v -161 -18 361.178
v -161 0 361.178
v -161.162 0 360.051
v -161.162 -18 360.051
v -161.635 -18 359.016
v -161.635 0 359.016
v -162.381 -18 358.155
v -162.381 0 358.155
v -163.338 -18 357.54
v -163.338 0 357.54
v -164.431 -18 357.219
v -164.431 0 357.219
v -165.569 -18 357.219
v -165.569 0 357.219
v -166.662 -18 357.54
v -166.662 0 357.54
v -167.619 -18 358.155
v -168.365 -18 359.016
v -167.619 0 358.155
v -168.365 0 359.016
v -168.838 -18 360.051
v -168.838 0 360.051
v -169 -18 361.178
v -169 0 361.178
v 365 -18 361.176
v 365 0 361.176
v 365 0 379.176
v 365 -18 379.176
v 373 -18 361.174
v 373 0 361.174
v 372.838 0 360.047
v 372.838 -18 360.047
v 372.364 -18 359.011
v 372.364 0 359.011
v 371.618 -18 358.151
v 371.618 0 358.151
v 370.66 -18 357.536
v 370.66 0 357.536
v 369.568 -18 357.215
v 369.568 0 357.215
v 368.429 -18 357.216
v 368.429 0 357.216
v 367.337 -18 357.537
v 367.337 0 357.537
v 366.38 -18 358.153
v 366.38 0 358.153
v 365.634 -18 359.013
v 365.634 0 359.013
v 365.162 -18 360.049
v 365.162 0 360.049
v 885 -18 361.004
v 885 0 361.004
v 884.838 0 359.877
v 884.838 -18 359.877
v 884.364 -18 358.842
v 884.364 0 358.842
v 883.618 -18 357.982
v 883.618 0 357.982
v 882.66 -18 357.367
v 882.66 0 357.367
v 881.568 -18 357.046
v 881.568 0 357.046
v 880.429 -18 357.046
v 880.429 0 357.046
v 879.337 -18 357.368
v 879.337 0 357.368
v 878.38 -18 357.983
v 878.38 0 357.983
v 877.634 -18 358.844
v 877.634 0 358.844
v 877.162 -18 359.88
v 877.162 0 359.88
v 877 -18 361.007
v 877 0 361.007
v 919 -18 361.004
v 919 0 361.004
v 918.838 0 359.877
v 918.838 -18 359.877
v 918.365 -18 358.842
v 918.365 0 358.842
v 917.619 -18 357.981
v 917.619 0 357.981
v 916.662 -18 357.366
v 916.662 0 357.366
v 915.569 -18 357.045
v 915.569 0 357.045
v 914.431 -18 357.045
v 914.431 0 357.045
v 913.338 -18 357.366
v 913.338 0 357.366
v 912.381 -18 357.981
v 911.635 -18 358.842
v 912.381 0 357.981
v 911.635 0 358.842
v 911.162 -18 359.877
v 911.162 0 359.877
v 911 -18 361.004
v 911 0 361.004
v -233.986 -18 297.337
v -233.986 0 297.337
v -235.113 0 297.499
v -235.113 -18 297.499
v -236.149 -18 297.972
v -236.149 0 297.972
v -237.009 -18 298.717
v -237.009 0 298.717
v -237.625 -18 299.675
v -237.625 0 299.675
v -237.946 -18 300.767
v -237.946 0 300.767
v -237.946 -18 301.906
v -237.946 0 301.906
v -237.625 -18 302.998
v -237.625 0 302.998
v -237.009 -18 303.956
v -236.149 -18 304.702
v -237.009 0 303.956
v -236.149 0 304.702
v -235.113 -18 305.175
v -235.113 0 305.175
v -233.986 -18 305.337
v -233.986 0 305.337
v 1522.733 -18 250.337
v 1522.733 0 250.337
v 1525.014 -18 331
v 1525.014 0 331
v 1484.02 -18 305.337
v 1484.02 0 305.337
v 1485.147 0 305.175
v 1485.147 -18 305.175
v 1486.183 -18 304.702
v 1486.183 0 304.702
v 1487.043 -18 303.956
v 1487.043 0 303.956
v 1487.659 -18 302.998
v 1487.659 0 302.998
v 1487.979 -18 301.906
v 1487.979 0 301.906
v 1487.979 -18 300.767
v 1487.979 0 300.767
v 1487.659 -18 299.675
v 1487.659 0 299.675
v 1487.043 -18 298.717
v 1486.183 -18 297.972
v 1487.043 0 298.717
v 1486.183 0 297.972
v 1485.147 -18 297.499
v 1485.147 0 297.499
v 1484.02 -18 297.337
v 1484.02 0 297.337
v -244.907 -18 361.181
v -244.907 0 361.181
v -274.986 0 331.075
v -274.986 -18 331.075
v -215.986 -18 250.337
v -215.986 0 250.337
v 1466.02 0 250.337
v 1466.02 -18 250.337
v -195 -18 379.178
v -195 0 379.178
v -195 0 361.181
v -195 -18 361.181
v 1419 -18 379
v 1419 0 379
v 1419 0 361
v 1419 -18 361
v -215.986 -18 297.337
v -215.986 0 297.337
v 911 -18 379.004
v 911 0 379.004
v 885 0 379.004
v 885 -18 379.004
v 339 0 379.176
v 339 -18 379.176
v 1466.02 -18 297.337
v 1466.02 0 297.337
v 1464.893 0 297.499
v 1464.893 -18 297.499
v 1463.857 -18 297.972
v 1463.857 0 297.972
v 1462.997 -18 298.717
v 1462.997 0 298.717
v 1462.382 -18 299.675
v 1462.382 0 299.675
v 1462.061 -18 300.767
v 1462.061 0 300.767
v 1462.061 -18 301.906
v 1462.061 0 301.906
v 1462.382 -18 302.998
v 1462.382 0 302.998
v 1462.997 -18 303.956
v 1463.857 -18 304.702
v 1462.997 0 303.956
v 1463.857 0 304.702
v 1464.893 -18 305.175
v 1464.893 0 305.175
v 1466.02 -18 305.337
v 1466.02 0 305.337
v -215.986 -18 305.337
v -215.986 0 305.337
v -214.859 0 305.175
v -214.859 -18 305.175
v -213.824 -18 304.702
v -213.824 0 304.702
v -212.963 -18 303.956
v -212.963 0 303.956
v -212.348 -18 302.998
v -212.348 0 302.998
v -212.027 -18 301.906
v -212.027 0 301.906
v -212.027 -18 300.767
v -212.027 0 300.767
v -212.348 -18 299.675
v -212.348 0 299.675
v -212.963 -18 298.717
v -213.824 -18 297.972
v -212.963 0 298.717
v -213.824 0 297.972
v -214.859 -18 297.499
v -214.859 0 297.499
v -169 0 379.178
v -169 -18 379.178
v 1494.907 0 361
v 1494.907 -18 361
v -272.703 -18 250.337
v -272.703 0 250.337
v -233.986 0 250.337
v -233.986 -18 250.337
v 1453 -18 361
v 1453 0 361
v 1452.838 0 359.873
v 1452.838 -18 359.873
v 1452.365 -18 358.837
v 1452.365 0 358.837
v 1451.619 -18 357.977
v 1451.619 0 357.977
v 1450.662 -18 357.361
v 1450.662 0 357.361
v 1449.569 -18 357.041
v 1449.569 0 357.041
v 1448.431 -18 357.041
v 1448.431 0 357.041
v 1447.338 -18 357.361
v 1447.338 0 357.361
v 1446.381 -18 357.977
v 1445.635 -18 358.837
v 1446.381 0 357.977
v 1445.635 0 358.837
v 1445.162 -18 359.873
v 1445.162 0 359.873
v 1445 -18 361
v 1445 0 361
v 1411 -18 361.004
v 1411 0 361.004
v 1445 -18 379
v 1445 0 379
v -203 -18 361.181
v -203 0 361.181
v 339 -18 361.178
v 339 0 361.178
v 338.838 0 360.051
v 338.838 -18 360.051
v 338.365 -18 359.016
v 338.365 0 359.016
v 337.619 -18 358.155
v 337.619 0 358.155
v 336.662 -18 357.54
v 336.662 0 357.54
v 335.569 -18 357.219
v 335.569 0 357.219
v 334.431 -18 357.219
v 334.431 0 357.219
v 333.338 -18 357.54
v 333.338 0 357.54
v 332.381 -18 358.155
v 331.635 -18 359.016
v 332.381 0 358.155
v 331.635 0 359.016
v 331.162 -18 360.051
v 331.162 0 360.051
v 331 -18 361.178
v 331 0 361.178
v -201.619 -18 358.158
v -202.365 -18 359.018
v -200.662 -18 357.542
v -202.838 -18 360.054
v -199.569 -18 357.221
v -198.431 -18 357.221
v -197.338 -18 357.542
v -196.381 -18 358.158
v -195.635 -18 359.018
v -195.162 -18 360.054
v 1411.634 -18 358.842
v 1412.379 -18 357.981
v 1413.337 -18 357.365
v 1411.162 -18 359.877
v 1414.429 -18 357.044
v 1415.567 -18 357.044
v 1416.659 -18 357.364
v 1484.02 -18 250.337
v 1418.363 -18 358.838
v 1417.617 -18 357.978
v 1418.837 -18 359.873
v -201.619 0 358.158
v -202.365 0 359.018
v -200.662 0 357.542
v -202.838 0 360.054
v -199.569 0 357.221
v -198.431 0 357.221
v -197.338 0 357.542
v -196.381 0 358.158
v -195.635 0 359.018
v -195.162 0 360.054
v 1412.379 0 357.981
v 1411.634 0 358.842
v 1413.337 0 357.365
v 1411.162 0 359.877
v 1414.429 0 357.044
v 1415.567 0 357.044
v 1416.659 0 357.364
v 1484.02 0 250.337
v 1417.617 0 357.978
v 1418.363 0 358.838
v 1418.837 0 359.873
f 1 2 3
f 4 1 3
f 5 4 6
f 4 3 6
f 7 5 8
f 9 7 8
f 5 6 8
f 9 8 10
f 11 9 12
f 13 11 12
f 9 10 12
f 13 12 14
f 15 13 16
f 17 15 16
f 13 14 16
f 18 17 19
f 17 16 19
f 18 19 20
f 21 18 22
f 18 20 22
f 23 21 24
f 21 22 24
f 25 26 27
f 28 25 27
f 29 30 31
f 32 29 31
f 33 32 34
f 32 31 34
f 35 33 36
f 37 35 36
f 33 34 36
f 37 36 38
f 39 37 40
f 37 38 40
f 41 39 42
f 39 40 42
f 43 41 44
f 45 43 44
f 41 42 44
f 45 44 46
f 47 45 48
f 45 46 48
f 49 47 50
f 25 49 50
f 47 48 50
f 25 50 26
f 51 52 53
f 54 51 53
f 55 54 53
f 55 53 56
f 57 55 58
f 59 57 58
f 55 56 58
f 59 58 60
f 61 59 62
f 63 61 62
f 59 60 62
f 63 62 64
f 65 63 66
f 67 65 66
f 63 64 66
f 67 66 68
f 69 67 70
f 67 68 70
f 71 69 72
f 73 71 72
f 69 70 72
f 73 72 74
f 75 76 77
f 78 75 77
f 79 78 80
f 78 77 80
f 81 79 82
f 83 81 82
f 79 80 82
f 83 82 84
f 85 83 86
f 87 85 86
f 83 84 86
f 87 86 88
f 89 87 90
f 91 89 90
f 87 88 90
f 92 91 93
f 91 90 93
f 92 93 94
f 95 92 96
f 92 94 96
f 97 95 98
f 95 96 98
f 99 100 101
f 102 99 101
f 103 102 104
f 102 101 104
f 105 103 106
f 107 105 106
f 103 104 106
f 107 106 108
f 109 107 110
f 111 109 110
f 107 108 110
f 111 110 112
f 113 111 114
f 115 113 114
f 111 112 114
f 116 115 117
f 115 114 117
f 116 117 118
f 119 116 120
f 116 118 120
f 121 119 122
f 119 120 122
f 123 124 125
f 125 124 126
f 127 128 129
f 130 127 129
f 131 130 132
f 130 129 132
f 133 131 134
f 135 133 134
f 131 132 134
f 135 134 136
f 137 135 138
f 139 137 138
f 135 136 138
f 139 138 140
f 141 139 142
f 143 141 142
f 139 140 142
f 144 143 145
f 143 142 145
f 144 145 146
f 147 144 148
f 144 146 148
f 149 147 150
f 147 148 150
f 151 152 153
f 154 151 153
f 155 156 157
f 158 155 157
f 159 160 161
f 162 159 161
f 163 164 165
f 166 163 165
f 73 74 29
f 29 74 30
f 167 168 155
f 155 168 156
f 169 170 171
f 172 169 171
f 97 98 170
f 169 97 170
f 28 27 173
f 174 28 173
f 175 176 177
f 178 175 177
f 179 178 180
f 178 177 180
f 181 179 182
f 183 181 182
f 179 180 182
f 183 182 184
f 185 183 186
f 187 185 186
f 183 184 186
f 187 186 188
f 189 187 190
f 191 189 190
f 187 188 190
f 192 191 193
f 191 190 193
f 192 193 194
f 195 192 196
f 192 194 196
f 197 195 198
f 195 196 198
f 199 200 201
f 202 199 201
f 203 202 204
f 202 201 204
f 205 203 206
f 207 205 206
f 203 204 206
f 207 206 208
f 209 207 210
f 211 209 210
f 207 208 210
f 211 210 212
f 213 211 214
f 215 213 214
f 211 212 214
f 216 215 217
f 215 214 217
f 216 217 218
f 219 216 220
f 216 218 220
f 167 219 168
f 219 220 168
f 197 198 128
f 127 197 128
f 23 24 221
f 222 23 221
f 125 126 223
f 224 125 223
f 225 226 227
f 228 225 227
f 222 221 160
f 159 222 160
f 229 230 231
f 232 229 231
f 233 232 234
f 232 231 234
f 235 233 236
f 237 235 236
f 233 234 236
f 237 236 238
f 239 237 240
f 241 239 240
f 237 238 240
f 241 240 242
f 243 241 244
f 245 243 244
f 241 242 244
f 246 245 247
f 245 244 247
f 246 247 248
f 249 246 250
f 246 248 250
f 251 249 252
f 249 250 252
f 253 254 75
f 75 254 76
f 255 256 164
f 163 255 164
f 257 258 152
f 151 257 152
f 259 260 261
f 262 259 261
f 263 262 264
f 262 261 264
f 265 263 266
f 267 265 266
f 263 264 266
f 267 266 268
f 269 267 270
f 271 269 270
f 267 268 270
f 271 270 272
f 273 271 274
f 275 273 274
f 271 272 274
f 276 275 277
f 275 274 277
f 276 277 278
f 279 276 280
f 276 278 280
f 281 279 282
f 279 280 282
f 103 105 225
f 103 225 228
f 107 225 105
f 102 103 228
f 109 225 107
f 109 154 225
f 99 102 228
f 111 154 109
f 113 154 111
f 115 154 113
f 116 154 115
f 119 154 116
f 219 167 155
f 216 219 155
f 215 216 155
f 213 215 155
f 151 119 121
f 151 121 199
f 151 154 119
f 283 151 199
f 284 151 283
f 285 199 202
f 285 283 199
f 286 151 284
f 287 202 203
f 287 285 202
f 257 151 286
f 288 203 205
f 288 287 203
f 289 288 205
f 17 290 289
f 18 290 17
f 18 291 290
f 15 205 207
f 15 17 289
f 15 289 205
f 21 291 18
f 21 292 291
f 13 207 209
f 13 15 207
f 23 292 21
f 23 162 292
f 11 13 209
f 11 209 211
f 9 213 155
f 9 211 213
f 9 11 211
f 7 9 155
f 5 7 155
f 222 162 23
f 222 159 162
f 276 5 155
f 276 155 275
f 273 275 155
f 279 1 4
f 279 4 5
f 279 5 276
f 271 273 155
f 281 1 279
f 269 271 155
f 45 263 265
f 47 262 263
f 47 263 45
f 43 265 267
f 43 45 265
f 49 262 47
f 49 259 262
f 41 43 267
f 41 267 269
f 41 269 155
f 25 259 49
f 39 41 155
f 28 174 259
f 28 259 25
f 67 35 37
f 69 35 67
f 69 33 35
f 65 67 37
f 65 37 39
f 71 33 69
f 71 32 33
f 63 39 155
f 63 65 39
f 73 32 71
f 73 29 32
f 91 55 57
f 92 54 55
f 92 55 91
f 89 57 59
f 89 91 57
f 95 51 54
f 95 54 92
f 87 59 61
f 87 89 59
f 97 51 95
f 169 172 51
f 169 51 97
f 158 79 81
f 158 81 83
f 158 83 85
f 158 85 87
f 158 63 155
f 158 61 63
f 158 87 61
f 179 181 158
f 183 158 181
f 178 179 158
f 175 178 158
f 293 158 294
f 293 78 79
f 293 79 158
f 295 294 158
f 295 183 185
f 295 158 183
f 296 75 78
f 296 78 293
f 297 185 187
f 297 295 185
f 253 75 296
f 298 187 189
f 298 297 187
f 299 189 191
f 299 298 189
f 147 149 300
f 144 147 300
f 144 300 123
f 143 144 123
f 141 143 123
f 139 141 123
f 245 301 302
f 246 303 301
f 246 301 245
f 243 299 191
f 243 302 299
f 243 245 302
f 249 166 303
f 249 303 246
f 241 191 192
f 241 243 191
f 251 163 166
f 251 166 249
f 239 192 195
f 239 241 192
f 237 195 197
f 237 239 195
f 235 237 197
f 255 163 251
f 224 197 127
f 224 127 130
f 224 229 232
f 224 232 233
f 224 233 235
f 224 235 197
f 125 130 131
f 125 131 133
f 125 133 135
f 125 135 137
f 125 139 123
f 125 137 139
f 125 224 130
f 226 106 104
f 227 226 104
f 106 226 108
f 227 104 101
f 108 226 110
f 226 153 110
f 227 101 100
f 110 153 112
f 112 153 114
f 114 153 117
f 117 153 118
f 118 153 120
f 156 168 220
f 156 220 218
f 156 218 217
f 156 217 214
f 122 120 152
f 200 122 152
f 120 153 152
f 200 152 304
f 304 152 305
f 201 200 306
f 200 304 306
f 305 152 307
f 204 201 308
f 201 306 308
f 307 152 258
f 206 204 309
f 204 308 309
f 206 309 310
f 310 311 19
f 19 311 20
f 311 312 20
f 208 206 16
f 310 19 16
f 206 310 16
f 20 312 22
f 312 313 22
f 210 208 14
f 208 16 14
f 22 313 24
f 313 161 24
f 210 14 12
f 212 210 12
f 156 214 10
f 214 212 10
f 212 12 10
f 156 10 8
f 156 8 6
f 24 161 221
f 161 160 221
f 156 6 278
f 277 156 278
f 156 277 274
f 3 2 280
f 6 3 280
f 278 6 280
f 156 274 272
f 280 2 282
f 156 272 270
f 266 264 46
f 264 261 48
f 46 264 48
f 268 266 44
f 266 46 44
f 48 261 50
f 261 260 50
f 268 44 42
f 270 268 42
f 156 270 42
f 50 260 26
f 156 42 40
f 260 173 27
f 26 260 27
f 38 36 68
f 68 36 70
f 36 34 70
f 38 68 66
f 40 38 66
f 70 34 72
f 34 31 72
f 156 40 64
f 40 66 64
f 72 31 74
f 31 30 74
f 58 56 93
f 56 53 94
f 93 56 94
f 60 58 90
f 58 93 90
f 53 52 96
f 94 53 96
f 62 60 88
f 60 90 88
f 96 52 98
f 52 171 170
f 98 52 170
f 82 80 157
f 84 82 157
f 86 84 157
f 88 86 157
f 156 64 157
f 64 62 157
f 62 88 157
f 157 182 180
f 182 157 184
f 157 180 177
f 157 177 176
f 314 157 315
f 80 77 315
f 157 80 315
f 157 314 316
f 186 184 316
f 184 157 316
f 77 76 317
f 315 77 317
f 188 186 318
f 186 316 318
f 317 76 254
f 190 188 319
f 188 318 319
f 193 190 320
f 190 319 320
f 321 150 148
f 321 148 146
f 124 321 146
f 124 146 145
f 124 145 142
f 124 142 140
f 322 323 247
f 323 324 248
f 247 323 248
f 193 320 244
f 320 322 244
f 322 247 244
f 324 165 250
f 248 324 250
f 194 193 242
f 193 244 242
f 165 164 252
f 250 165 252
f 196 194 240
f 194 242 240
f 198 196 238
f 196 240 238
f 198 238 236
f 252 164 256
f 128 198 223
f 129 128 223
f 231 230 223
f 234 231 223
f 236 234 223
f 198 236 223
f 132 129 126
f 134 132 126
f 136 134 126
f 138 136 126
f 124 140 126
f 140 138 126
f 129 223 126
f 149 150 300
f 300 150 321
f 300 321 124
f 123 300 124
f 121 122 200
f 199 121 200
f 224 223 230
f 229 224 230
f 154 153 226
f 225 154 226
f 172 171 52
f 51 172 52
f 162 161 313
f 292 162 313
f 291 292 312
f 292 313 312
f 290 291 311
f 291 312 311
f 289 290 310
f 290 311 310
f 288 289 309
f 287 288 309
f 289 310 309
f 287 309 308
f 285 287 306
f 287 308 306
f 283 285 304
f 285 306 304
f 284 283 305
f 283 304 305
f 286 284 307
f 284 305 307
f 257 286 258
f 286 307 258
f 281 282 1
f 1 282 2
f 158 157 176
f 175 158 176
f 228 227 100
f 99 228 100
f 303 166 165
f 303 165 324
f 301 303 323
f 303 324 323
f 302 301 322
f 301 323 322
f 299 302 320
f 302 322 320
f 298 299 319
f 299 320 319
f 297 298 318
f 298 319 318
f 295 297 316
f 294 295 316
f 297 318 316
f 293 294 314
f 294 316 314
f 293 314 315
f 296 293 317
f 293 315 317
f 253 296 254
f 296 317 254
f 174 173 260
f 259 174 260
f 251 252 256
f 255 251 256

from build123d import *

# Parameters (mm, degrees)
F1_DEPTH = 18


# Not quite as in the source:
# - ends of sketch curves that miss each other by under 0.0002 mm in the source are joined


with BuildPart() as f1:
    # F0 (on Front) → F1 (new body)
    with BuildSketch(Plane.XZ):
        with BuildLine():
            Line((1444.9999982887, 361), (1444.9999982887, 379))
            Line((1444.9999982887, 379), (1418.9999982887, 379))
            Line((1418.9999982887, 379), (1418.9999982887, 361.0032042947))
            Line((1418.9999982887, 361.0032042947), (1418.9999982887, 361))
            ThreePointArc((1418.9999982887, 361), (1414.9978620926, 357.0032048651), (1410.9999984313, 361.0042723931))
            Line((1410.9999984313, 361.0042723931), (918.9999984313, 361.0042723931))
            ThreePointArc((918.9999984313, 361.0042723931), (914.9999984313, 357.0042723931), (910.9999984313, 361.0042723931))
            Line((910.9999984313, 361.0042723931), (910.9999984313, 379.0042723931))
            Line((910.9999984313, 379.0042723931), (884.9999984313, 379.0042723931))
            Line((884.9999984313, 379.0042723931), (884.9999984313, 361.0055952483))
            Line((884.9999984313, 361.0055952483), (884.9999984313, 361.0042723931))
            ThreePointArc((884.9999984313, 361.0042723931), (880.9986755762, 357.005595467), (876.9999986501, 361.0069181034))
            Line((876.9999986501, 361.0069181034), (372.9999978512, 361.1735978616))
            ThreePointArc((372.9999978512, 361.1735978616), (368.9986752099, 357.1749209454), (364.9999982887, 361.1762435819))
            Line((364.9999982887, 361.1762435819), (364.9999982887, 379.1762435819))
            Line((364.9999982887, 379.1762435819), (338.9999982887, 379.1762435819))
            Line((338.9999982887, 379.1762435819), (338.9999982887, 361.1783797782))
            ThreePointArc((338.9999982887, 361.1783797782), (334.9999982887, 357.1783797782), (330.9999982887, 361.1783797782))
            Line((330.9999982887, 361.1783797782), (-161.0000017113, 361.1783797782))
            ThreePointArc((-161.0000017113, 361.1783797782), (-165.0000017113, 357.1783797782), (-169.0000017113, 361.1783797782))
            Line((-169.0000017113, 361.1783797782), (-169.0000017113, 379.1783797782))
            Line((-169.0000017113, 379.1783797782), (-195.0000017113, 379.1783797782))
            Line((-195.0000017113, 379.1783797782), (-195.0000012844, 361.180516095))
            ThreePointArc((-195.0000012844, 361.180516095), (-198.9999999526, 357.1805172846), (-202.9999987156, 361.1805160001))
            Line((-202.9999987156, 361.1805160001), (-215.9862284595, 361.1805160001))
            Line((-215.9862284595, 361.1805160001), (-233.9862284595, 361.1805160001))
            Line((-233.9862284595, 361.1805160001), (-244.90749278, 361.1805160001))
            Line((-244.90749278, 361.1805160001), (-274.9862284595, 331.0746893941))
            Line((-274.9862284595, 331.0746893941), (-272.7034209311, 250.3365797868))
            Line((-272.7034209311, 250.3365797868), (-233.9862284595, 250.3365797868))
            Line((-233.9862284595, 250.3365797868), (-233.9862284595, 297.3365797868))
            ThreePointArc((-233.9862284595, 297.3365797868), (-237.9862284595, 301.3365797868), (-233.9862284595, 305.3365797868))
            Line((-233.9862284595, 305.3365797868), (-215.9862284595, 305.3365797868))
            ThreePointArc((-215.9862284595, 305.3365797868), (-211.9862284595, 301.3365797868), (-215.9862284595, 297.3365797868))
            Line((-215.9862284595, 297.3365797868), (-215.9862284595, 250.3365797868))
            Line((-215.9862284595, 250.3365797868), (-134.9862284595, 250.3365797868))
            Line((-134.9862284595, 250.3365797868), (1385.0137715405, 250.3365797868))
            Line((1385.0137715405, 250.3365797868), (1466.020051896, 250.3365797868))
            Line((1466.020051896, 250.3365797868), (1466.020051896, 297.3365797868))
            ThreePointArc((1466.020051896, 297.3365797868), (1462.020051896, 301.3365797868), (1466.020051896, 305.3365797868))
            Line((1466.020051896, 305.3365797868), (1484.020051896, 305.3365797868))
            ThreePointArc((1484.020051896, 305.3365797868), (1488.020051896, 301.3365797868), (1484.020051896, 297.3365797868))
            Line((1484.020051896, 297.3365797868), (1484.020051896, 250.3365797868))
            Line((1484.020051896, 250.3365797868), (1522.7328349544, 250.3365797868))
            Line((1522.7328349544, 250.3365797868), (1525.0137715405, 331))
            Line((1525.0137715405, 331), (1494.9069982887, 361))
            Line((1494.9069982887, 361), (1466.022162316, 361))
            Line((1466.022162316, 361), (1452.9999982887, 361))
            ThreePointArc((1452.9999982887, 361), (1448.9999982887, 357), (1444.9999982887, 361))
        make_face()
    extrude(amount=F1_DEPTH)


solid = f1.part
